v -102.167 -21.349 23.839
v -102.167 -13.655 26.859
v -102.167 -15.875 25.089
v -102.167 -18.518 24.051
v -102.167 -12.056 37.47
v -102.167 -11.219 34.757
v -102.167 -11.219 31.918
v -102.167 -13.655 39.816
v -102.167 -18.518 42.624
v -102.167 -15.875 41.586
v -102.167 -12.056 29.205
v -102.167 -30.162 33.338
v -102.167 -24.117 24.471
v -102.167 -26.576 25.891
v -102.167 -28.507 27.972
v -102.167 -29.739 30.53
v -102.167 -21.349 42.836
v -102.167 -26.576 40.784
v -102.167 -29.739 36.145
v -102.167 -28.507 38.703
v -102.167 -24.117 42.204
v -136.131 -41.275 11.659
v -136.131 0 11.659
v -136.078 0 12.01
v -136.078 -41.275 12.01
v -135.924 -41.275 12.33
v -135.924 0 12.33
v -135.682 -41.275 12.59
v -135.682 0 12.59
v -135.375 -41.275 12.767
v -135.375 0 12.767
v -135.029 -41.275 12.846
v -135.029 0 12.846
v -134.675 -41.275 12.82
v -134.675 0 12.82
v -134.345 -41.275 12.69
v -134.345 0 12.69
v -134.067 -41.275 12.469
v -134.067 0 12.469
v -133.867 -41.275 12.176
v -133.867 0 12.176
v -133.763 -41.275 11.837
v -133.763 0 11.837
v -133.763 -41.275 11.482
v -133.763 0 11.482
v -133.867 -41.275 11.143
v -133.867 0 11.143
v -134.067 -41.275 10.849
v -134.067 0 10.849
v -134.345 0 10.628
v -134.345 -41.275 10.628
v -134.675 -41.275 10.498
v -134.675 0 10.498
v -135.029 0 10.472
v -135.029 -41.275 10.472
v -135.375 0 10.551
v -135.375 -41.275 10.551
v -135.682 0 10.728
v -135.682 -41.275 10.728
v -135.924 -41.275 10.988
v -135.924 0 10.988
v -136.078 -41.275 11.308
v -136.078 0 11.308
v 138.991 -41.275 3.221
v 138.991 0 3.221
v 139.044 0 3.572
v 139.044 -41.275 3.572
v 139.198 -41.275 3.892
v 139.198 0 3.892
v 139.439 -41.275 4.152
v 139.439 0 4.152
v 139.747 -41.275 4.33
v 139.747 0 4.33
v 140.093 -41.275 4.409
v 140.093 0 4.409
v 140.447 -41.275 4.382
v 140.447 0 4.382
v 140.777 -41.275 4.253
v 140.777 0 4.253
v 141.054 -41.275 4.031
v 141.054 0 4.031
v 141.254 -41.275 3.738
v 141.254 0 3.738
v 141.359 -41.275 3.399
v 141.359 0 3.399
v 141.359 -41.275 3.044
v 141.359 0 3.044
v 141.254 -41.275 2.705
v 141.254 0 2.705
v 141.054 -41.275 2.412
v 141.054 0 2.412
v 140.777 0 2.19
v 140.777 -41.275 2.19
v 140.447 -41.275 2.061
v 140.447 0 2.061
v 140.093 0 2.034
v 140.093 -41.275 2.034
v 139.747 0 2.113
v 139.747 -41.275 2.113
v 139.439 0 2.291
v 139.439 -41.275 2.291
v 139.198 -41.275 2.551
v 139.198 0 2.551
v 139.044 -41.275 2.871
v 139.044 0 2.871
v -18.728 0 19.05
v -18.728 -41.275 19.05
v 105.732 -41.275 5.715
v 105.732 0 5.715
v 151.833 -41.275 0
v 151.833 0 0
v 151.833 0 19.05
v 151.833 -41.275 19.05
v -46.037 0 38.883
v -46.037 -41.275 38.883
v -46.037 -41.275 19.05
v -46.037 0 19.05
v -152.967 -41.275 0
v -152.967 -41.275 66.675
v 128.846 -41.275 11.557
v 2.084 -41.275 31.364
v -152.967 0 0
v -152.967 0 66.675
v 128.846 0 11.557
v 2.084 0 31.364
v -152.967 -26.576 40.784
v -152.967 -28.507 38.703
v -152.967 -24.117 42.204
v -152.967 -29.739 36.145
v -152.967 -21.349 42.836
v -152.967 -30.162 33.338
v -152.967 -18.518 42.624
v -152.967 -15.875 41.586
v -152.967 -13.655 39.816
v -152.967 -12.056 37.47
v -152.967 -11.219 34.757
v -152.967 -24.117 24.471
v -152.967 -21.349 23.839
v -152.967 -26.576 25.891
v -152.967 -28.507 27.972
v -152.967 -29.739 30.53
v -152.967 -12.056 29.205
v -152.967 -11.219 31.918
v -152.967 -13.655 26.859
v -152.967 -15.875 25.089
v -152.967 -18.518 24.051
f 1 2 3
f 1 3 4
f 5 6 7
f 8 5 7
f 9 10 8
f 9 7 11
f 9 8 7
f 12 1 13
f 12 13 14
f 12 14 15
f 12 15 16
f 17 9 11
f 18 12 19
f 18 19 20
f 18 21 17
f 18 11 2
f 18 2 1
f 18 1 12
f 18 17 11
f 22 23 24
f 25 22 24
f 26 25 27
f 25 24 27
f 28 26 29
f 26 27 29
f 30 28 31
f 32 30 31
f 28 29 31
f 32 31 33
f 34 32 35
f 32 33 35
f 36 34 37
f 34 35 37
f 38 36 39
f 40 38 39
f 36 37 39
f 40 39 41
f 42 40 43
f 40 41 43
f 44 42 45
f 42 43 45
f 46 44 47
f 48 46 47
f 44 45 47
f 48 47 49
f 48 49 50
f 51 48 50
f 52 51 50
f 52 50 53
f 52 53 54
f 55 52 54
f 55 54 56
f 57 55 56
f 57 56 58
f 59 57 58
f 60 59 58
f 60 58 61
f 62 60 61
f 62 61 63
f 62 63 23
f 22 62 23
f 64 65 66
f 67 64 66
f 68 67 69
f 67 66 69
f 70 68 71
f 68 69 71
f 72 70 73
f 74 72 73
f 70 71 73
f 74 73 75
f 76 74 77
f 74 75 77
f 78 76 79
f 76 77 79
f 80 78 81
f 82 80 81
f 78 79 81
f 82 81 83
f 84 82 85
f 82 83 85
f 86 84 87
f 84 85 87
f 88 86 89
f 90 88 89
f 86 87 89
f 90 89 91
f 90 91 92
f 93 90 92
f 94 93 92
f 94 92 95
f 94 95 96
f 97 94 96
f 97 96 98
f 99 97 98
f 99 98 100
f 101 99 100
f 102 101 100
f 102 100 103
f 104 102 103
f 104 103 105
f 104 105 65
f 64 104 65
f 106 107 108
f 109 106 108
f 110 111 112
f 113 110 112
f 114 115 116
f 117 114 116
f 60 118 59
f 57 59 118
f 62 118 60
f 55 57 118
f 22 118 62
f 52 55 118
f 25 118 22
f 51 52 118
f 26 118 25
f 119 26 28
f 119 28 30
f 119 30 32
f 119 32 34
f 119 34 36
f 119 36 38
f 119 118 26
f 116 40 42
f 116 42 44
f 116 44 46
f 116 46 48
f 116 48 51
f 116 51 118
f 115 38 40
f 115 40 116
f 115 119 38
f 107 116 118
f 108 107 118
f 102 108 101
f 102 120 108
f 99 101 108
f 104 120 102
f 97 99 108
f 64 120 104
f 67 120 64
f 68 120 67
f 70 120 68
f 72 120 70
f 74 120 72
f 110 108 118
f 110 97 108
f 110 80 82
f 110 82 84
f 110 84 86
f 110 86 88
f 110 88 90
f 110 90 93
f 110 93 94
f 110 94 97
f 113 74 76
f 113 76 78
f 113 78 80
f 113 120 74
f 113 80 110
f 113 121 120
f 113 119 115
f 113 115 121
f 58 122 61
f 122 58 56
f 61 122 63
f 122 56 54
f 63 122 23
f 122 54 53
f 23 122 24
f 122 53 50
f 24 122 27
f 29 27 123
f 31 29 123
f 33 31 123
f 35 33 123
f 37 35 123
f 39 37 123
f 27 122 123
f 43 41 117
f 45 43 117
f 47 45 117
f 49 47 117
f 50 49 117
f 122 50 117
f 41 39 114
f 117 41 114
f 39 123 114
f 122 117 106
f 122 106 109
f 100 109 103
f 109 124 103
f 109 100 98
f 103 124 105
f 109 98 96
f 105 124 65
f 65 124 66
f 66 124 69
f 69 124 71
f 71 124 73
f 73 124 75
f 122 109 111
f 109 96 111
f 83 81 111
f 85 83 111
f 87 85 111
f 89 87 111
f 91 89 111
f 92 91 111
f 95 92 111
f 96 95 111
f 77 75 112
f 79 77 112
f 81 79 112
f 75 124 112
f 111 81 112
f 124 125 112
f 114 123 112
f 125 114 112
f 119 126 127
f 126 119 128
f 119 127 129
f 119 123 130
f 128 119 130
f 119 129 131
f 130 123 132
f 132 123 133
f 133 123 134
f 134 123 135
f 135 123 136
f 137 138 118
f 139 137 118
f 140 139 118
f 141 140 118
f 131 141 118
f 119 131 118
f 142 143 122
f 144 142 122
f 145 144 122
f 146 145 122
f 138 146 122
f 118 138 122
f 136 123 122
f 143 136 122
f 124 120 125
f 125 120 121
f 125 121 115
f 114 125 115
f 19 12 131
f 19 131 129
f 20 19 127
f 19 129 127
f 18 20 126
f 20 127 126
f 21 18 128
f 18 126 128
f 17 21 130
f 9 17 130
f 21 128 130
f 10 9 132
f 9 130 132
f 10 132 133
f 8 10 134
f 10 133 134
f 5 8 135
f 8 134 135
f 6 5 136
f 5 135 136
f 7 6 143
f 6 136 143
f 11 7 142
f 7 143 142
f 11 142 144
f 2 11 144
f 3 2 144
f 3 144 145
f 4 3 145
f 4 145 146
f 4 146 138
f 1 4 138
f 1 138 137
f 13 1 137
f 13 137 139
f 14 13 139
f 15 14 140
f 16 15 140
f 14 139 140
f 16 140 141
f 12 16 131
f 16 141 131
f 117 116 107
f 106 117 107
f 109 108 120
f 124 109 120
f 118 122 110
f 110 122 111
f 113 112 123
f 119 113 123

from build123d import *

# Parameters (mm, degrees)
F1_DEPTH  = 41.275
F2_R      = 9.525
F3_DEPTH  = 50.8
F5_DEPTH  = 45.72
F7_DEPTH  = 60.96
F8_R      = 1.190625
F9_DEPTH  = 63.5
F10_R     = 1.190625
F11_DEPTH = 63.5


with BuildPart() as f1:
    # F0 (on Front) → F1 (new body)
    with BuildSketch(Plane.XZ):
        Polygon((-152.966577, 66.675), (-152.966577, 0), (151.833423, 0), (151.833423, 19.05), align=None)
    extrude(amount=F1_DEPTH)

    # F2 (on face) → F3 (cut)
    with BuildSketch(Plane(origin=(-152.966577, 0, 0), x_dir=(0, -1, 0), z_dir=(-1, 0, 0))):
        with Locations((20.6375, 33.3375)):
            Circle(F2_R)
    extrude(amount=-F3_DEPTH, mode=Mode.SUBTRACT)

    # F4 (on face) → F5 (cut)
    with BuildSketch(Plane.XZ.offset(41.275)):
        Polygon((105.732426, 5.715), (128.846437, 11.557001), (2.083721, 31.363675), (-18.727573, 19.05), align=None)
    extrude(amount=-F5_DEPTH, mode=Mode.SUBTRACT)

    # F6 (on face) → F7 (cut)
    with BuildSketch(Plane.XZ.offset(41.275)):
        Polygon((-18.727573, 19.05), (-46.036839, 38.882513), (-46.036839, 19.05), align=None)
        Polygon((-18.727573, 19.05), (2.083721, 31.363675), (-46.036839, 38.882513), align=None)
    extrude(amount=-F7_DEPTH, mode=Mode.SUBTRACT)

    # F8 (on face) → F9 (cut)
    with BuildSketch(Plane(origin=(0, 0, 0), x_dir=(-1, 0, 0), z_dir=(0, 1, 0))):
        with Locations((134.939879, 11.659147)):
            Circle(F8_R)
    extrude(amount=-F9_DEPTH, mode=Mode.SUBTRACT)

    # F10 (on face) → F11 (cut)
    with BuildSketch(Plane(origin=(0, 0, 0), x_dir=(-1, 0, 0), z_dir=(0, 1, 0))):
        with Locations((-140.181614, 3.221456)):
            Circle(F10_R)
    extrude(amount=-F11_DEPTH, mode=Mode.SUBTRACT)


solid = f1.part
